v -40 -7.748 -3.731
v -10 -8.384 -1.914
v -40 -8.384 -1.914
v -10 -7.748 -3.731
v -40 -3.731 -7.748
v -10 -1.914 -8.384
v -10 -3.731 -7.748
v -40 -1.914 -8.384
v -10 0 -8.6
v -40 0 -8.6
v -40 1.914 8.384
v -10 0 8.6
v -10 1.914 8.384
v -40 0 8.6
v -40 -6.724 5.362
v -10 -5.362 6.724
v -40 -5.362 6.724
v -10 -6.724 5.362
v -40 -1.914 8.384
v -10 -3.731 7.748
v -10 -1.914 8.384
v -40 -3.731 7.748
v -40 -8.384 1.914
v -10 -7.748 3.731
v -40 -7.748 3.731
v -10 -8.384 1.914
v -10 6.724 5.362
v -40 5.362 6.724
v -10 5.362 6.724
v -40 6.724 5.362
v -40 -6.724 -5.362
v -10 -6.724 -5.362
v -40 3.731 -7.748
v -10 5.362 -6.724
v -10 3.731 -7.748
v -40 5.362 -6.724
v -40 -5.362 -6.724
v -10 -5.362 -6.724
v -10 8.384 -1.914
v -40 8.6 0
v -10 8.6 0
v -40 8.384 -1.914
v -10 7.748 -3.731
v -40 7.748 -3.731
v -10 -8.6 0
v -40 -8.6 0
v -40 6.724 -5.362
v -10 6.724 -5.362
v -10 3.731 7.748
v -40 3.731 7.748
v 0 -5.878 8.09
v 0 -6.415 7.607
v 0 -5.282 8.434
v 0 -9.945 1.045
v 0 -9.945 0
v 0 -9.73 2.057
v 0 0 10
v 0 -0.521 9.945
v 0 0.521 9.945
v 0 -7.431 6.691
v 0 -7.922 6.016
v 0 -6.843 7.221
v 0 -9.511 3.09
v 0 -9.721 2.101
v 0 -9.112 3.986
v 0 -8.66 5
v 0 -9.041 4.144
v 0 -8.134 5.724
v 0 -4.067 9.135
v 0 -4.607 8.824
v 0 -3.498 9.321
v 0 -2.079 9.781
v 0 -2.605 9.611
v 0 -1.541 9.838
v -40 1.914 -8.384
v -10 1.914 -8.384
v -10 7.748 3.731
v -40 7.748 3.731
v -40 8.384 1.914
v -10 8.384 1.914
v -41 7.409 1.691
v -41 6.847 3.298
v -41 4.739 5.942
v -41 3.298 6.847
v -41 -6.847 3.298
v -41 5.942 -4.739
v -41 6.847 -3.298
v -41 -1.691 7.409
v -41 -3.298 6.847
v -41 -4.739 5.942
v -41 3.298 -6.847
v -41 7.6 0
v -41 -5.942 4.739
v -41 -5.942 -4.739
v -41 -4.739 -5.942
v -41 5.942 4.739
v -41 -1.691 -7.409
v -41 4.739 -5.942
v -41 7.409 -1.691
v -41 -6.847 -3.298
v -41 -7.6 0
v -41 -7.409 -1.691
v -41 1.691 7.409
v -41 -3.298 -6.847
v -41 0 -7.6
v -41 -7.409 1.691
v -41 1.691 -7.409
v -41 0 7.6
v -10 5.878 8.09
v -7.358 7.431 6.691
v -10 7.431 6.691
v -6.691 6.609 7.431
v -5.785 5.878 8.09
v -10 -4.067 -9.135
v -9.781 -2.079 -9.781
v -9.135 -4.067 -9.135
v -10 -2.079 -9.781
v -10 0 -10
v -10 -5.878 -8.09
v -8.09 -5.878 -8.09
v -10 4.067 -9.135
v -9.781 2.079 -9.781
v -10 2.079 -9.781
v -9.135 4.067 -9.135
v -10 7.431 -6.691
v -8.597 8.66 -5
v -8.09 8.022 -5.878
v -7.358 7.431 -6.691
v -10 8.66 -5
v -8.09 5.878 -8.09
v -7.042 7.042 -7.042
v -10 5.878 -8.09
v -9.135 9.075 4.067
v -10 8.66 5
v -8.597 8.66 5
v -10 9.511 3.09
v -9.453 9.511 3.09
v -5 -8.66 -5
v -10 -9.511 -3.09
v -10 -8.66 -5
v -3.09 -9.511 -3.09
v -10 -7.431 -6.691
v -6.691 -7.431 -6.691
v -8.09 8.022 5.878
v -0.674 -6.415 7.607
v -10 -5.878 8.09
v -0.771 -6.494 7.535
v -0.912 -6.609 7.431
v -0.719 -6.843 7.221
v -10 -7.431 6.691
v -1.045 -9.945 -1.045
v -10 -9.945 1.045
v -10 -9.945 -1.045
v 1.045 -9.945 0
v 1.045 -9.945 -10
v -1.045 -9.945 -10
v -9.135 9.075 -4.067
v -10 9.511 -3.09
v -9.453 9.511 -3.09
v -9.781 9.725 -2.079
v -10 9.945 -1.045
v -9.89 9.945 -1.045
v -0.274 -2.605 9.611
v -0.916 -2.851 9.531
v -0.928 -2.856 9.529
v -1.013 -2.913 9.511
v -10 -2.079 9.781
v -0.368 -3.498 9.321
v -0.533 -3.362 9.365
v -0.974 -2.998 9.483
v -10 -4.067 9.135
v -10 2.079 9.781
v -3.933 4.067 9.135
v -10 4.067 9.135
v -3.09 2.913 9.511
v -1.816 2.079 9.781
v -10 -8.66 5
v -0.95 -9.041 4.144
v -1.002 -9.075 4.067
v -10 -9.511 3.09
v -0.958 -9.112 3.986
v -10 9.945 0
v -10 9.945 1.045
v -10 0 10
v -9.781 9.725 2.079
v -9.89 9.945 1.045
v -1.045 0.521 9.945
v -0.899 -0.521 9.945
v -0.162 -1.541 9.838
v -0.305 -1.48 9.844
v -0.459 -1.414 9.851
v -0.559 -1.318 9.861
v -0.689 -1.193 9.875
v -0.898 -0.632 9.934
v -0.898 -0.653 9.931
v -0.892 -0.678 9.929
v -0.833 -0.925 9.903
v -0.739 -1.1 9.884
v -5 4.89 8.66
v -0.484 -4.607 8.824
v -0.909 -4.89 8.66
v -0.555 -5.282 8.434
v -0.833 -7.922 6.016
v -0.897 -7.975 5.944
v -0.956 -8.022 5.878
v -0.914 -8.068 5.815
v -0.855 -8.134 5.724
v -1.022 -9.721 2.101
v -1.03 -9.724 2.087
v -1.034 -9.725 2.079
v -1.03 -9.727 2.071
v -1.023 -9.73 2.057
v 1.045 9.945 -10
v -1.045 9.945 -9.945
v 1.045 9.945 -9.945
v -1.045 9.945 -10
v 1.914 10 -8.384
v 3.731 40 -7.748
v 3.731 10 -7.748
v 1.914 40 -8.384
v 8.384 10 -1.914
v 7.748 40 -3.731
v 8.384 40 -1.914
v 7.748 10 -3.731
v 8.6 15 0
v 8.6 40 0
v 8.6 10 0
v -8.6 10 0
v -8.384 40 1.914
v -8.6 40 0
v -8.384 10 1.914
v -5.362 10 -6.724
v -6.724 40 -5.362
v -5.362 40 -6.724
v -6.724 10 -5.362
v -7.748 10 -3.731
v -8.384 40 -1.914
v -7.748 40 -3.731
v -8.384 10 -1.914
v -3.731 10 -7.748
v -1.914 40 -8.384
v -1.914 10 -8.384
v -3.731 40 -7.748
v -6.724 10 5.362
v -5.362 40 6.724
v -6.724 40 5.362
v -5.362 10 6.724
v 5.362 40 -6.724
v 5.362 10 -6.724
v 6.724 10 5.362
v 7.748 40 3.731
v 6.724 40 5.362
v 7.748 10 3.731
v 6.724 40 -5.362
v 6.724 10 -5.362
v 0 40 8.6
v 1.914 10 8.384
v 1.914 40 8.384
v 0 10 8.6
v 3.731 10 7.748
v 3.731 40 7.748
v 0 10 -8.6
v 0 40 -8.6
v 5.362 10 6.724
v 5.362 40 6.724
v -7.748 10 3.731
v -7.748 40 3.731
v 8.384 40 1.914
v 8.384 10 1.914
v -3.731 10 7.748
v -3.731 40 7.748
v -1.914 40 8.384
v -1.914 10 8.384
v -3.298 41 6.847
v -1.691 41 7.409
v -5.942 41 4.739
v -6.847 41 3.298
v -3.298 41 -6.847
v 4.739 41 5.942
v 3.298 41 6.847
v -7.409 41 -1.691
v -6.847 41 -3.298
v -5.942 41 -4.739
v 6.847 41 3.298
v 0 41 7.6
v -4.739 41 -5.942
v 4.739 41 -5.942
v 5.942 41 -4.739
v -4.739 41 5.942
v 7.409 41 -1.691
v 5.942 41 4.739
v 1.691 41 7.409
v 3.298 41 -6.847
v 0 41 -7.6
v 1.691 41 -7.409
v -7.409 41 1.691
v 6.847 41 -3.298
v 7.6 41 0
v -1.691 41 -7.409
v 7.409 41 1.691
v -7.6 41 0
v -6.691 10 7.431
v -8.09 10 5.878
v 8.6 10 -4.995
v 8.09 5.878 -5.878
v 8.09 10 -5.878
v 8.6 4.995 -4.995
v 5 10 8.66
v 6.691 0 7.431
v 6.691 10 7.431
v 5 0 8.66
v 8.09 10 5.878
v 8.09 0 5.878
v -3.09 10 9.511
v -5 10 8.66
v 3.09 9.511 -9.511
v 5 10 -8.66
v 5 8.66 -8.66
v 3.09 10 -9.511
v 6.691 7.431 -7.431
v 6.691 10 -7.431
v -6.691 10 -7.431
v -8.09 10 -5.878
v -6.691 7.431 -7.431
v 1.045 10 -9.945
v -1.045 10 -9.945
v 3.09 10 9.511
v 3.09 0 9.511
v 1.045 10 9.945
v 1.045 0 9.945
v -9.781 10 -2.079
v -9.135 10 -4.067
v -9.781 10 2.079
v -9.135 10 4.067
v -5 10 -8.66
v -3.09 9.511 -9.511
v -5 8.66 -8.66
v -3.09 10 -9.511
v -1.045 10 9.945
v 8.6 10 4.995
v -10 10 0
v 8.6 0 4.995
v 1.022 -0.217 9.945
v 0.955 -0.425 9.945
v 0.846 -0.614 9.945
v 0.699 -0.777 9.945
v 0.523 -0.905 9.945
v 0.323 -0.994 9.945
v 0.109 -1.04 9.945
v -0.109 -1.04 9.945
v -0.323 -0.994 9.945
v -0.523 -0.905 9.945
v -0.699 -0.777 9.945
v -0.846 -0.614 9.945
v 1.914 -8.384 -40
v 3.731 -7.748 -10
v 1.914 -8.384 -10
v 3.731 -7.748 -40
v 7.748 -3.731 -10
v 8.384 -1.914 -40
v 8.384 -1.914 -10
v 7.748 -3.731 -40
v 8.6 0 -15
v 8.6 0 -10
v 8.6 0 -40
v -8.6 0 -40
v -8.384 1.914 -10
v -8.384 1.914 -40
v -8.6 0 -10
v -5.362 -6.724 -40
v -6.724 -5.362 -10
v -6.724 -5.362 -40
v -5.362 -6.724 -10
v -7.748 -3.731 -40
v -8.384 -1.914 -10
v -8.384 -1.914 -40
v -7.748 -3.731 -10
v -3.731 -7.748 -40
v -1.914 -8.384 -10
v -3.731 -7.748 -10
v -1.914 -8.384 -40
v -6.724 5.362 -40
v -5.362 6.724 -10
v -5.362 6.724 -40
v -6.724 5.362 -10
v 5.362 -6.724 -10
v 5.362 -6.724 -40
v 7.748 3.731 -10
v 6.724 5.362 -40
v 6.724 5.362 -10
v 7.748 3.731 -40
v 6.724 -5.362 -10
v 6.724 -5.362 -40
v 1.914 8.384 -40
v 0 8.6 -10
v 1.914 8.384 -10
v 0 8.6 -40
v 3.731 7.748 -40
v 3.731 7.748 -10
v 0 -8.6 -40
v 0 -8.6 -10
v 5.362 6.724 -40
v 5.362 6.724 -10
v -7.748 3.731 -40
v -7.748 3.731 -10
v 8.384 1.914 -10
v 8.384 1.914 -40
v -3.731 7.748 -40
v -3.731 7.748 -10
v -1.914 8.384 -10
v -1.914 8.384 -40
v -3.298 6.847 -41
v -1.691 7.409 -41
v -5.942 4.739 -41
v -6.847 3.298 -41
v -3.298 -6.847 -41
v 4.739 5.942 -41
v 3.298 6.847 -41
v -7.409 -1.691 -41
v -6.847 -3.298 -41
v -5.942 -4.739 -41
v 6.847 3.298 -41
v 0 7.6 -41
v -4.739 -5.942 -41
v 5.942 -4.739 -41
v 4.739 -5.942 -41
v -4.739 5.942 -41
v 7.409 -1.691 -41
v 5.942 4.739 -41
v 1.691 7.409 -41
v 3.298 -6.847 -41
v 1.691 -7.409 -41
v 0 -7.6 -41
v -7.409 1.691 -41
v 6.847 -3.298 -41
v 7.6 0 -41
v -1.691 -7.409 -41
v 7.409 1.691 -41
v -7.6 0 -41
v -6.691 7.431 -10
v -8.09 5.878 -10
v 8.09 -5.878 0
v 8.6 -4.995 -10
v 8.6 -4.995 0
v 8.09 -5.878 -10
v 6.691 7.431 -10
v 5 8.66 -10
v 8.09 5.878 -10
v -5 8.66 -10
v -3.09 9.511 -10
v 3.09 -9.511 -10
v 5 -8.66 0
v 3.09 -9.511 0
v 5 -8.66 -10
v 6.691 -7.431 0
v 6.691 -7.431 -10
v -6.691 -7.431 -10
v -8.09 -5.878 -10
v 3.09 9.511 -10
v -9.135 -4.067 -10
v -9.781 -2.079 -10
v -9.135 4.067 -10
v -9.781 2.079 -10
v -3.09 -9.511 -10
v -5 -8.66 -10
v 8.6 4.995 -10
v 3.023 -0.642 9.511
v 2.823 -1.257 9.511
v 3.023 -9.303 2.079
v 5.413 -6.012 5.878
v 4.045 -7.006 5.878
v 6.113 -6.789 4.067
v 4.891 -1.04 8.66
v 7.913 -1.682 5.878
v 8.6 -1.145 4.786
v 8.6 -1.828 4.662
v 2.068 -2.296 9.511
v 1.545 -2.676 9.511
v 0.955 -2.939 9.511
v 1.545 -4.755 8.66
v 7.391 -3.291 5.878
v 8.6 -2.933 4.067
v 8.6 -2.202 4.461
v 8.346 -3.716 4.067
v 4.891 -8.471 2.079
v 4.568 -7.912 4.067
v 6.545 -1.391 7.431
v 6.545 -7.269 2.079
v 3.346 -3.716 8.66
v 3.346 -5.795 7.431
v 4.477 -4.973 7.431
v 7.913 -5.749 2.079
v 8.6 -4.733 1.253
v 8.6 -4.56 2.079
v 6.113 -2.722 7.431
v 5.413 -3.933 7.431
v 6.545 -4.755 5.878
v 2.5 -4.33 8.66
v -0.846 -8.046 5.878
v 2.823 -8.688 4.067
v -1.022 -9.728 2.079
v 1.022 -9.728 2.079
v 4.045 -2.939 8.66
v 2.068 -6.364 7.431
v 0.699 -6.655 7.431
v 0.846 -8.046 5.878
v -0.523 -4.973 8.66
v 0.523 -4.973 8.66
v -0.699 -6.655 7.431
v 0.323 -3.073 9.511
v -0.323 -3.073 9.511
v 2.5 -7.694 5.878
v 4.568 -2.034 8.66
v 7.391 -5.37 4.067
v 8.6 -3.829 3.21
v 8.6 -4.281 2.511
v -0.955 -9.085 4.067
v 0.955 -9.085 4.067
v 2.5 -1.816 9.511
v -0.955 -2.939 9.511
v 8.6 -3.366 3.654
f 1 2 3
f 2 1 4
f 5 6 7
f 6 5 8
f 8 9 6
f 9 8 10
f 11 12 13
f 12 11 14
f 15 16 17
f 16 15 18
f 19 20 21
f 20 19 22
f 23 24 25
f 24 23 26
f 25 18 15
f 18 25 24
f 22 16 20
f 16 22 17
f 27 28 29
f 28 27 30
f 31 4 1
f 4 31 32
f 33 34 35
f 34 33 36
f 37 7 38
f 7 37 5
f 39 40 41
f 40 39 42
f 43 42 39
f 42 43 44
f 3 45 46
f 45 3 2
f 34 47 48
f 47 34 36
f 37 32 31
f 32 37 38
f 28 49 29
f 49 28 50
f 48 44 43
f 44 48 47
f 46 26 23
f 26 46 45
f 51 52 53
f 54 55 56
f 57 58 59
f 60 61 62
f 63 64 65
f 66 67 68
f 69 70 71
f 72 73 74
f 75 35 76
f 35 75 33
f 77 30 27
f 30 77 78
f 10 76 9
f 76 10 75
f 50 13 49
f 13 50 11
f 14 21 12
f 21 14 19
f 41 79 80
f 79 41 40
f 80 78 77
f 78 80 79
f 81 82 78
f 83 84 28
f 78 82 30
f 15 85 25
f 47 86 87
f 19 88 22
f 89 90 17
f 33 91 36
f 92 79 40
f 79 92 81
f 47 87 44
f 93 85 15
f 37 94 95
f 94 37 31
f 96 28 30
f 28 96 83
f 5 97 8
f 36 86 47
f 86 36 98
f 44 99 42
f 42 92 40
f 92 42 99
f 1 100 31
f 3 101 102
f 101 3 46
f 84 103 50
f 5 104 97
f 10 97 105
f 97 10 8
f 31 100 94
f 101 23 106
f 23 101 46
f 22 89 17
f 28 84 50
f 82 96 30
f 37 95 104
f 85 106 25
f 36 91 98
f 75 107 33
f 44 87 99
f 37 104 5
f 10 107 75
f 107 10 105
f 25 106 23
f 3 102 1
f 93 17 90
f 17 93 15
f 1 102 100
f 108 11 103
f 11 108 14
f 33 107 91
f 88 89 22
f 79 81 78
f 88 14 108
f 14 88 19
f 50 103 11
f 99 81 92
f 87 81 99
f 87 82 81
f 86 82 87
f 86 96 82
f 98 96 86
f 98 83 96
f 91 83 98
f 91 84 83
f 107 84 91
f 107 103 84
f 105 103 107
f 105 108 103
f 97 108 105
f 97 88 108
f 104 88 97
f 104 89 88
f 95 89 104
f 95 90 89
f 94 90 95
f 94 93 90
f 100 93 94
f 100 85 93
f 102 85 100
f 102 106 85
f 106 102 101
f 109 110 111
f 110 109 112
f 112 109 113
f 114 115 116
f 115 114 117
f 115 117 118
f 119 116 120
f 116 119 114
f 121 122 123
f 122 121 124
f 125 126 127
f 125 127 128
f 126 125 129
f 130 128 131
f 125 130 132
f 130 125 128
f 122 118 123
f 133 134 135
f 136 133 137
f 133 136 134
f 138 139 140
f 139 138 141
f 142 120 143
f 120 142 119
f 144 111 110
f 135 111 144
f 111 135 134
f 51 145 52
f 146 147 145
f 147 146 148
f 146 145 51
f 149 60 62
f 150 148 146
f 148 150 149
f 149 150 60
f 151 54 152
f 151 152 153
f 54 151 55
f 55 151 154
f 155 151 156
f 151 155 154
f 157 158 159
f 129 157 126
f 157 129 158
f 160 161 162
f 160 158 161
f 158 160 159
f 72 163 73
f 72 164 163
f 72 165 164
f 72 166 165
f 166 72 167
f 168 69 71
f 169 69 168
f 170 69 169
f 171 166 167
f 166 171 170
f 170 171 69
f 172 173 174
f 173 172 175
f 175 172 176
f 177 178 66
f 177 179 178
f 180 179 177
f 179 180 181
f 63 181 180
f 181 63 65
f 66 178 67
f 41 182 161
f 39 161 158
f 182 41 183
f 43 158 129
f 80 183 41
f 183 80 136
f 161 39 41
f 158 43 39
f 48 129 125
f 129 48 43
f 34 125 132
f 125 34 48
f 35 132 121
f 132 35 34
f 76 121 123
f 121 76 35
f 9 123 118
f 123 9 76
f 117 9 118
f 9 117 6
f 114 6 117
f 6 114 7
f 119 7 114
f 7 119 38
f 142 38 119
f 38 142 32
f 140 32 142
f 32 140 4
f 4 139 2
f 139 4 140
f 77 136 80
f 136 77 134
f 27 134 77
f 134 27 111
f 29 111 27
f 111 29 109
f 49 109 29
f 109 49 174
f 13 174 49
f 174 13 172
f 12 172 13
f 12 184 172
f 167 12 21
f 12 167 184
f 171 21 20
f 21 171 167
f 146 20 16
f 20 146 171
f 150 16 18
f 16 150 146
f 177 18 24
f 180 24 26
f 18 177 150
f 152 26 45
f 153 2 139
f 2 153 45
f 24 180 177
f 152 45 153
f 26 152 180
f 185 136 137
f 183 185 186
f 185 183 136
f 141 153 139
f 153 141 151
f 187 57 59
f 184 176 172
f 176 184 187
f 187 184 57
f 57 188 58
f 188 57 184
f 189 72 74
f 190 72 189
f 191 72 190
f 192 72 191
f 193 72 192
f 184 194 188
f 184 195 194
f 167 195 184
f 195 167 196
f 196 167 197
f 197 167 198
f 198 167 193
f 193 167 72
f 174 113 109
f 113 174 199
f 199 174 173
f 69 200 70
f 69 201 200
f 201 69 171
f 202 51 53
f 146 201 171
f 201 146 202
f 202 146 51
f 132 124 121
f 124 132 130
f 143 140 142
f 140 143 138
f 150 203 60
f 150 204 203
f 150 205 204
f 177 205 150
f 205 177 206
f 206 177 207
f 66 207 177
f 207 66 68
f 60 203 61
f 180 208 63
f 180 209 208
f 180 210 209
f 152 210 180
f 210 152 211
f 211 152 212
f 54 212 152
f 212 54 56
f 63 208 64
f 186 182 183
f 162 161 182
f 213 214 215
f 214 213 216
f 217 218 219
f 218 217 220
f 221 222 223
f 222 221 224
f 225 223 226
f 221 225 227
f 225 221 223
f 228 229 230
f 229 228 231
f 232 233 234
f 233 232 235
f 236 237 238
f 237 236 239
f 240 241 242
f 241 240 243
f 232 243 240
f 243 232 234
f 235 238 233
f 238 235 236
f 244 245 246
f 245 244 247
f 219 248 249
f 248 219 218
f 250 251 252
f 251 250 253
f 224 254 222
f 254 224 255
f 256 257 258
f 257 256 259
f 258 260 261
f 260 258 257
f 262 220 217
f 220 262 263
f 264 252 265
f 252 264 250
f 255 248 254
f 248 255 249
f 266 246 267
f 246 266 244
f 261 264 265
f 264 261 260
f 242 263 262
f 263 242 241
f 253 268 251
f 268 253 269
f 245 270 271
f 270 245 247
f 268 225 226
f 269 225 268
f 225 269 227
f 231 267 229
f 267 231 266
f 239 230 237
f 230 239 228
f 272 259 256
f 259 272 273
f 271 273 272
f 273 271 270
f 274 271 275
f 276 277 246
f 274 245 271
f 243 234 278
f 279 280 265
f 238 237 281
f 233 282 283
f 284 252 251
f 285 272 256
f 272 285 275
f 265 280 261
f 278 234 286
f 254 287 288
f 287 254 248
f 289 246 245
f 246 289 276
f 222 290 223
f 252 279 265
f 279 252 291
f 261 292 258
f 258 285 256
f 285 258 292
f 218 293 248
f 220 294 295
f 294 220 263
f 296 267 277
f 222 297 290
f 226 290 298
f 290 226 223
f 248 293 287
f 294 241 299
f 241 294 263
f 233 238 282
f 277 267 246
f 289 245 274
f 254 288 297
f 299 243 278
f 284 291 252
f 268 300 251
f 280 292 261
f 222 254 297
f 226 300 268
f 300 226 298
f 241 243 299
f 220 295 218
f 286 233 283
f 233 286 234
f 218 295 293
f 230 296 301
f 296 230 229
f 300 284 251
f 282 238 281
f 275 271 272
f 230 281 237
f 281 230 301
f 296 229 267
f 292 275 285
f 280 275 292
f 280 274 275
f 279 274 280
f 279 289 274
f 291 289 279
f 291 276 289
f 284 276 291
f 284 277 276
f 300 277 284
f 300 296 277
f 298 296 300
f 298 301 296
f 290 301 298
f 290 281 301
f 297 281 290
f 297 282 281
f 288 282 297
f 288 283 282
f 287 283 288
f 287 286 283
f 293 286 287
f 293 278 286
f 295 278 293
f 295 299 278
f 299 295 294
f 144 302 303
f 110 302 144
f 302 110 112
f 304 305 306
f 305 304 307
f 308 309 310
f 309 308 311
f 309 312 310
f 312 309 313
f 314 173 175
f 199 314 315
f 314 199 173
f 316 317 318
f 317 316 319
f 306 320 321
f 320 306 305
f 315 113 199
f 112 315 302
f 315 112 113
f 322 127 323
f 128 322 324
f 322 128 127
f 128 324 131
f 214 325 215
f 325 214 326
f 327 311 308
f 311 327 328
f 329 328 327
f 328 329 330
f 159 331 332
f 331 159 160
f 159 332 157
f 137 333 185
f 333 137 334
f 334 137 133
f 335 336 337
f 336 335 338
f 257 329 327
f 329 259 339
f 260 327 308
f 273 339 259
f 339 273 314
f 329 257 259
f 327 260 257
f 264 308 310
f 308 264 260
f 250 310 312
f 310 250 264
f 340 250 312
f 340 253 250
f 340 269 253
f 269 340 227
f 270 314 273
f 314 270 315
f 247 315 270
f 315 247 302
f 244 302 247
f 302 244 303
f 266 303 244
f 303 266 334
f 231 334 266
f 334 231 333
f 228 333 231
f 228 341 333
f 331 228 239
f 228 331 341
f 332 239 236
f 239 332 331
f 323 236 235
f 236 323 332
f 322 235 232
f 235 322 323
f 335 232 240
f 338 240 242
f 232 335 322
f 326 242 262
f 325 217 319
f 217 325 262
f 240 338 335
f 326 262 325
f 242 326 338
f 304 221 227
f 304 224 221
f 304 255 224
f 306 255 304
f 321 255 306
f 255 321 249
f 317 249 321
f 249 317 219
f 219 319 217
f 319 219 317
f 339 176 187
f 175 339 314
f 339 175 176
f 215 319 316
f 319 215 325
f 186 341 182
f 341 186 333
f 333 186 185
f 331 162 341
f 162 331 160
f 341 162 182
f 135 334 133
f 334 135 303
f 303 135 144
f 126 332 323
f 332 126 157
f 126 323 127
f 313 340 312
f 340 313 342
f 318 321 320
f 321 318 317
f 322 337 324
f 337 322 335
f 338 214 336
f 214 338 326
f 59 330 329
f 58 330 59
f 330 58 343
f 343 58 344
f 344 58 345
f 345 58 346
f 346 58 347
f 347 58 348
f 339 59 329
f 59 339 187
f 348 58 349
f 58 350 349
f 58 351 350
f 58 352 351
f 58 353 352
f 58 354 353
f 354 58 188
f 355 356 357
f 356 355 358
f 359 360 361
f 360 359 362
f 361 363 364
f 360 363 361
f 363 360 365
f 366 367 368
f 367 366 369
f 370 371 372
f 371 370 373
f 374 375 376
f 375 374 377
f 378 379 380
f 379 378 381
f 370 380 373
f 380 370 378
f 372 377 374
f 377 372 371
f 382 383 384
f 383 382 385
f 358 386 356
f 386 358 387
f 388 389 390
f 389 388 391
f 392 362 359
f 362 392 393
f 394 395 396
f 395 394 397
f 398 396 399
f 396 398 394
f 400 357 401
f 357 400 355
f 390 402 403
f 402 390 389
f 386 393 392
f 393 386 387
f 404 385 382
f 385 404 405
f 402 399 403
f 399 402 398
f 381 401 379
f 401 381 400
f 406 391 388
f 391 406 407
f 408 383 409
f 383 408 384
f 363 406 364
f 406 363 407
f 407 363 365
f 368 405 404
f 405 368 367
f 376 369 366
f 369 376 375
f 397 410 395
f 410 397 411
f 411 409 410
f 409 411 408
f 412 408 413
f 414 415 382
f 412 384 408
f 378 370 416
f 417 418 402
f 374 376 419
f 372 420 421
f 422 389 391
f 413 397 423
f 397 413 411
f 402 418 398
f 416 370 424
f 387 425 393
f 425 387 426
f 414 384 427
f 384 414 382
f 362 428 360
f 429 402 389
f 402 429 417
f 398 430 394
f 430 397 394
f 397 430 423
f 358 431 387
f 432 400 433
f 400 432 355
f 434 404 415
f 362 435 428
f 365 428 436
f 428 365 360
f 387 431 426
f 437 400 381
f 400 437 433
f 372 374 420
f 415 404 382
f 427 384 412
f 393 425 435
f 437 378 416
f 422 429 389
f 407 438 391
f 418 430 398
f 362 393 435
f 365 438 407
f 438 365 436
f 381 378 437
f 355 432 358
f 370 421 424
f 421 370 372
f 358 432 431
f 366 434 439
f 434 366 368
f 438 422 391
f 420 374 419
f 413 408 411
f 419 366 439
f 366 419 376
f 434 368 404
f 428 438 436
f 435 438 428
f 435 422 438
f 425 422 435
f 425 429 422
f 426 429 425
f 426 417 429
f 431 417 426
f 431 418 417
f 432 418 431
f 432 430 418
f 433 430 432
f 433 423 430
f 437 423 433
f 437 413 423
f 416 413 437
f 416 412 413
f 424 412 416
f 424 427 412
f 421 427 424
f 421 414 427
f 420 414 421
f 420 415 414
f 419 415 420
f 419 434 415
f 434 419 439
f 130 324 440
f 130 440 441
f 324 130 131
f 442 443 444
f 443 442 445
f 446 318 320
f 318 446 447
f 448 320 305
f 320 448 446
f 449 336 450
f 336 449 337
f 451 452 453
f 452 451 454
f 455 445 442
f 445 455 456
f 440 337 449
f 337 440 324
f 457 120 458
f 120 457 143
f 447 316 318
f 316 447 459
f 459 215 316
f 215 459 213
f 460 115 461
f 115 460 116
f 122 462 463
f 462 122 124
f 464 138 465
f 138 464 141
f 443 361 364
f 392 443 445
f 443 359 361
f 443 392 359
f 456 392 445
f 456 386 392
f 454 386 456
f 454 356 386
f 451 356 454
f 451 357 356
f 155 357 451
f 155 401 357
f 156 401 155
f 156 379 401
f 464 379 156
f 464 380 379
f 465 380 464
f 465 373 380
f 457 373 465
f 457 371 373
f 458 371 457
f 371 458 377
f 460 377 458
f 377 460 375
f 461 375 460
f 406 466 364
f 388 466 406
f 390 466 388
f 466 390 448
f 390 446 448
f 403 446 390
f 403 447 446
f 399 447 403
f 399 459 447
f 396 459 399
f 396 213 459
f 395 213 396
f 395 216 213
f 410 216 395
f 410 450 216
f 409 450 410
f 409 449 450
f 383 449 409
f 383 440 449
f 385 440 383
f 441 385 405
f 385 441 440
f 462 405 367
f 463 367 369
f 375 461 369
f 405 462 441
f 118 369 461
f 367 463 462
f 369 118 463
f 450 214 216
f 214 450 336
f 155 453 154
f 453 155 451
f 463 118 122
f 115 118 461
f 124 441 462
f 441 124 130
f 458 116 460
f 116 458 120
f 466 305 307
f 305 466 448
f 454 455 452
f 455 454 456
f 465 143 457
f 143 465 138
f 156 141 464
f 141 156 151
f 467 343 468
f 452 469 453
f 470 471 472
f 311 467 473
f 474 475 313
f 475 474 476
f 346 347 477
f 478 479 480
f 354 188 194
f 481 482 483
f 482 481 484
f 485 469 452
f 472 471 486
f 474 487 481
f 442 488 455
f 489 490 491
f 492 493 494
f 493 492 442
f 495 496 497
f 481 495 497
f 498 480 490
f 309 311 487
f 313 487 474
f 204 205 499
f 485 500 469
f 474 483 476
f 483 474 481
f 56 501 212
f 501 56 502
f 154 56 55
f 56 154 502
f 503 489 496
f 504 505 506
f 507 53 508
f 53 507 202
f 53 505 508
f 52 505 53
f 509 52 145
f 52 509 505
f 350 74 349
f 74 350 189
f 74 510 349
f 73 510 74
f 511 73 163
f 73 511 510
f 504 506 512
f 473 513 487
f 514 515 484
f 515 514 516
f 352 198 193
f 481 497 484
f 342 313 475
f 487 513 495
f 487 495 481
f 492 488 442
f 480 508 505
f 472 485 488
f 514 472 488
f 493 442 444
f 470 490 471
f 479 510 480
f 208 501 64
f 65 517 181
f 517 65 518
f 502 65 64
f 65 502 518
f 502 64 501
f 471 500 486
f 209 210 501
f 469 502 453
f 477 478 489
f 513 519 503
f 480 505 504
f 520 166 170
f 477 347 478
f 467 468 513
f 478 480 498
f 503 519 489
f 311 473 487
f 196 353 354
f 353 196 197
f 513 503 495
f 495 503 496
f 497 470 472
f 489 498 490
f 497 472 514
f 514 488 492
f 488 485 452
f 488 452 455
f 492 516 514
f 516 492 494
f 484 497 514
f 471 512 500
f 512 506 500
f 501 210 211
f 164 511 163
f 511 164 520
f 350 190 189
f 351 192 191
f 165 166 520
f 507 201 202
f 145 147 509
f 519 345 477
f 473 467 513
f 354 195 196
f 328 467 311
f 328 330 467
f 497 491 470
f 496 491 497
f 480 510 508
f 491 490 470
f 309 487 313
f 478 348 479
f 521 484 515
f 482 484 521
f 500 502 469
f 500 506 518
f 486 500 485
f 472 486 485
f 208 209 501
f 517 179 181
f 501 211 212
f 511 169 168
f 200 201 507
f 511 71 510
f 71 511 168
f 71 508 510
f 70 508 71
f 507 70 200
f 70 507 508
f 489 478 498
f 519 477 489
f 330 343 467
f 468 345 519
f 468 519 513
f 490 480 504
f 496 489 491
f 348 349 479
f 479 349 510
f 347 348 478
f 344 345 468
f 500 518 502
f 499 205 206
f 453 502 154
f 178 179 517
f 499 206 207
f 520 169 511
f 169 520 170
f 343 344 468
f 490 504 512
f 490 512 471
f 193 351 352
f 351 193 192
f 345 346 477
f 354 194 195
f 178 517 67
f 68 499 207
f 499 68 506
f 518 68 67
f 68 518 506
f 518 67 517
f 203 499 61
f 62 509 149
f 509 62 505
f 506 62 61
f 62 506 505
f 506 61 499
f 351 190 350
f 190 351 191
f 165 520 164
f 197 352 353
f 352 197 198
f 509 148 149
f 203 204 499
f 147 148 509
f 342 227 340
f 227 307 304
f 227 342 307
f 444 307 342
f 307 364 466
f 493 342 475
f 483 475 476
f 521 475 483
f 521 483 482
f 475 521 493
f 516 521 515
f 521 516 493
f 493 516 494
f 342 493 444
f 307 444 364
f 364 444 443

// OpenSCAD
/* [Parameters] */
Plugs = 3; // [2:5]
Plug_height = 30;
Outer_Diameter = 20;
Inner_Diameter = 17.2;
Angle1 = 90; // [0,45,72,90,135,180]
Angle2 = 90; // [0,45,72,90,135,180]

/* [Hidden] */
Inner_Radius = Inner_Diameter / 2; 
Outer_Radius = Outer_Diameter / 2;
taper = Inner_Radius - 1;
CutBox = Inner_Radius + 5;
InvCutBox = CutBox - (CutBox + CutBox);

GenPart(Outer_Diameter, Inner_Diameter, Plugs, Angle1, Angle2, Inner_Radius, Outer_Radius, taper, CutBox, InvCutBox);

module plug(OR, IR, TPR) {
  union(){
    cylinder(r1=IR, r2=IR, h=Plug_height+OR, center=false);
    translate([0, 0, Plug_height+OR]){
      cylinder(r1=IR, r2=TPR, h=1, center=false);
    }
    cylinder(r1=OR, r2=OR, h=OR, center=false);
  }
}

module my_135_endcap() {
  rotate([45, 0, 0]){
    translate([0, 0, 20]){
      cylinder(r1=10, r2=10, h=10, center=false);
    }
  }
}

module GenPart(OD, ID, P, A1, A2, IR, OR, TPR, CB, ICB) {
  if (P == 2) {
    if (A1 == 45) {
      my_2_way_45(OR, IR, TPR, CB);
    } else if (A1 == 0 || A2 == 180) {
      my_2_way_0_elbow2(OR, IR, TPR, CB);
    } else if (A1 == 135) {
      my_2_way_135_elbow(OR, IR, TPR, CB);
    } else if (A1 == 90) {
      my_2_way_90_elbow(OR, IR, TPR, ICB);
    }

  } else if (P == 3) {
    if (A1 == 90 && A2 == 90) {
      my_3_way_corner(OR, IR, TPR, CB);
    } else if (A1 == 45 && A2 == 90 || A1 == 90 && A2 == 45) {
      my_3_way_1_45(OR, IR, TPR, ICB);
    } else if (A1 == 90 && A2 == 135 || A1 == 135 && A2 == 90) {
      my_3_way_corner_135(OR, IR, TPR, CB);
    } else if (A1 == 120 && A2 == 120) {
      my_3_way_Star(OR, IR, TPR, CB);
    } else if (A1 == 90 && A2 == 180 || A1 == 180 && A2 == 90) {
      my_3_way_0_90_180_elbow(OR, IR, TPR, CB);
    }

  } else if (P == 4) {
    if (A1 == 90 && A2 == 90) {
      my_4_way_corner(OR, IR, TPR, CB);
    } else if (A1 == 90 && A2 == 180 || A1 == 180 && A2 == 90) {
      my_4_way_flat(OR, IR, TPR, CB);
    }

  } else if (P == 5) {
    if (A1 == 90 && A2 == 90) {
      my_5_way(OR, IR, TPR, CB);
    } else if (A1 == 72 && A2 == 0 || A1 == 0 && A2 == 72) {
      my_5_way_star(OR, IR, TPR, CB);
    }

  }

}

module my_135_Endcapped_Both() {
  union(){
    rotate([0, 90, 0]){
      translate([20, 0, 0]){
        my_135_endcapped_2();
      }
    }
    translate([50, 0, 0]){
      rotate([0, 270, 0]){
        translate([-20, 0, 0]){
          mirror([1,0,0]){
            my_135_endcapped_2();
          }
        }
      }
    }
  }
}

module my_135_endcapped_2() {
  difference() {
    union(){
      rotate([270, 0, 0]){
        translate([0, 0, 25]){
          // torus
          rotate_extrude($fn=32) {
            translate([Outer_Radius, 0, 0]) {
              circle(r=5, $fn=32);
            }
          }
        }
      }
      rotate([90, 0, 0]){
        translate([0, 0, -8]){
          // torus
          rotate_extrude($fn=32) {
            translate([Outer_Radius, 0, 0]) {
              circle(r=4, $fn=32);
            }
          }
        }
      }
      my_2_way_135_elbow(null, null, null, null);
    }

    translate([CutBox, 0, 0]){
      cube([10, 60, 60], center=true);
    }
  }
}

module my_2_way_135_capped() {
  difference() {
    union(){
      rotate([45, 0, 0]){
        plug(null, null, null);
      }
      rotate([270, 0, 0]){
        plug(null, null, null);
      }
      sphere(r=10);
      my_135_endcap();
    }

    translate([13.45, 0, 0]){
      cube([10, 50, 50], center=true);
    }
    translate([-13.45, 0, 0]){
      cube([10, 50, 50], center=true);
    }
  }
}

module my_2_way_45(OR, IR, TPR, CB) {
  difference() {
    union(){
      rotate([0, 0, 0]){
        translate([0, 0, 15]){
          plug(OR, IR, TPR);
        }
        cylinder(r1=OR, r2=OR, h=20, center=false);
      }
      rotate([45, 0, 0]){
        translate([0, 0, 15]){
          plug(OR, IR, TPR);
        }
        cylinder(r1=OR, r2=OR, h=20, center=false);
      }
      sphere(r=OR);
    }

    translate([CB, 0, 0]){
      cube([10, 50, 50], center=true);
    }
  }
}

module my_5_way(OR, IR, TPR, CB) {
  difference() {
    union(){
      rotate([0, 0, 0]){
        plug(OR, IR, TPR);
      }
      rotate([270, 0, 0]){
        plug(OR, IR, TPR);
      }
      rotate([180, 0, 0]){
        plug(OR, IR, TPR);
      }
      rotate([90, 0, 0]){
        plug(OR, IR, TPR);
      }
      rotate([180, 90, 0]){
        plug(OR, IR, TPR);
      }
      sphere(r=OR);
    }

    translate([CB, 0, 0]){
      cube([10, 30, 30], center=true);
    }
  }
}

module my_2_way_0_elbow2(OR, IR, TPR, CB) {
  difference() {
    union(){
      translate([0, 5, 0]){
        rotate([90, 0, 0]){
          plug(OR, IR, TPR);
        }
      }
      translate([0, -5, 0]){
        rotate([270, 0, 0]){
          plug(OR, IR, TPR);
        }
      }
      sphere(r=OR);
    }

    translate([CB, 0, 0]){
      cube([10, 30, 30], center=true);
    }
  }
}

module my_2_way_90_elbow(OR, IR, TPR, ICB) {
  difference() {
    union(){
      rotate([180, 0, 0]){
        plug(OR, IR, TPR);
      }
      rotate([270, 0, 0]){
        plug(OR, IR, TPR);
      }
      sphere(r=OR);
    }

    translate([ICB, 0, 0]){
      cube([10, 30, 30], center=true);
    }
  }
}

module my_2_way_135_elbow(OR, IR, TPR, CB) {
  difference() {
    union(){
      rotate([45, 0, 0]){
        plug(OR, IR, TPR);
      }
      rotate([270, 0, 0]){
        plug(OR, IR, TPR);
      }
      sphere(r=OR);
    }

    translate([CB, 0, 0]){
      cube([10, 30, 30], center=true);
    }
  }
}

module my_3_way_corner(OR, IR, TPR, CB) {
  difference() {
    union(){
      rotate([180, 90, 0]){
        plug(OR, IR, TPR);
      }
      rotate([270, 0, 0]){
        plug(OR, IR, TPR);
      }
      rotate([180, 0, 0]){
        plug(OR, IR, TPR);
      }
      sphere(r=OR);
    }

    translate([CB, 0, 0]){
      cube([10, 30, 30], center=true);
    }
  }
}

module my_3_way_1_45(OR, IR, TPR, ICB) {
  difference() {
    union(){
      rotate([0, 0, 0]){
        translate([0, 0, 15]){
          plug(OR, IR, TPR);
        }
        cylinder(r1=OR, r2=OR, h=20, center=false);
      }
      rotate([45, 0, 0]){
        translate([0, 0, 15]){
          plug(OR, IR, TPR);
        }
        cylinder(r1=OR, r2=OR, h=20, center=false);
      }
      rotate([90, 0, 90]){
        translate([0, 0, 15]){
          plug(OR, IR, TPR);
        }
        cylinder(r1=OR, r2=OR, h=20, center=false);
      }
      sphere(r=OR);
    }

    translate([ICB, 0, 0]){
      cube([10, 50, 50], center=true);
    }
  }
}

module my_3_way_corner_135(OR, IR, TPR, CB) {
  difference() {
    union(){
      rotate([135, 90, 0]){
        plug(OR, IR, TPR);
      }
      rotate([270, 0, 0]){
        plug(OR, IR, TPR);
      }
      rotate([180, 0, 0]){
        plug(OR, IR, TPR);
      }
      sphere(r=OR);
    }

    rotate([0, 270, 0]){
      translate([CB, 0, 0]){
        cube([10, 30, 30], center=true);
      }
    }
  }
}

module my_3_way_Star(OR, IR, TPR, CB) {
  difference() {
    union(){
      rotate([0, 0, 0]){
        plug(OR, IR, TPR);
      }
      rotate([120, 0, 0]){
        plug(OR, IR, TPR);
      }
      sphere(r=10);
      rotate([240, 0, 0]){
        plug(OR, IR, TPR);
      }
    }

    translate([CB, 0, 0]){
      cube([10, 30, 30], center=true);
    }
  }
}

module my_3_way_0_90_180_elbow(OR, IR, TPR, CB) {
  difference() {
    union(){
      rotate([0, 0, 0]){
        plug(OR, IR, TPR);
      }
      rotate([270, 0, 0]){
        plug(OR, IR, TPR);
      }
      rotate([180, 0, 0]){
        plug(OR, IR, TPR);
      }
      sphere(r=OR);
    }

    translate([CB, 0, 0]){
      cube([10, 30, 30], center=true);
    }
  }
}

module my_4_way_corner(OR, IR, TPR, CB) {
  difference() {
    union(){
      rotate([0, 0, 0]){
        plug(OR, IR, TPR);
      }
      rotate([270, 0, 0]){
        plug(OR, IR, TPR);
      }
      rotate([180, 0, 0]){
        plug(OR, IR, TPR);
      }
      rotate([180, 90, 0]){
        plug(OR, IR, TPR);
      }
      sphere(r=OR);
    }

    translate([CB, 0, 0]){
      cube([10, 30, 30], center=true);
    }
  }
}

module my_4_way_flat(OR, IR, TPR, CB) {
  difference() {
    union(){
      rotate([0, 0, 0]){
        plug(OR, IR, TPR);
      }
      rotate([270, 0, 0]){
        plug(OR, IR, TPR);
      }
      rotate([180, 0, 0]){
        plug(OR, IR, TPR);
      }
      rotate([90, 0, 0]){
        plug(OR, IR, TPR);
      }
      sphere(r=OR);
    }

    translate([CB, 0, 0]){
      cube([10, 30, 30], center=true);
    }
  }
}

module my_5_way_star(OR, IR, TPR, CB) {
  difference() {
    union(){
      rotate([0, 0, 0]){
        translate([0, 0, 5]){
          plug(OR, IR, TPR);
        }
        cylinder(r1=OR, r2=10, h=15, center=false);
      }
      rotate([72, 0, 0]){
        translate([0, 0, 5]){
          plug(OR, IR, TPR);
        }
        cylinder(r1=OR, r2=10, h=15, center=false);
      }
      sphere(r=OR);
      rotate([144, 0, 0]){
        translate([0, 0, 5]){
          plug(OR, IR, TPR);
        }
        cylinder(r1=OR, r2=OR, h=15, center=false);
      }
      rotate([216, 0, 0]){
        translate([0, 0, 5]){
          plug(OR, IR, TPR);
        }
        cylinder(r1=OR, r2=OR, h=15, center=false);
      }
      rotate([288, 0, 0]){
        translate([0, 0, 5]){
          plug(OR, IR, TPR);
        }
        cylinder(r1=OR, r2=OR, h=15, center=false);
      }
    }

    translate([CB, 0, 0]){
      cube([10, 50, 50], center=true);
    }
  }
}
